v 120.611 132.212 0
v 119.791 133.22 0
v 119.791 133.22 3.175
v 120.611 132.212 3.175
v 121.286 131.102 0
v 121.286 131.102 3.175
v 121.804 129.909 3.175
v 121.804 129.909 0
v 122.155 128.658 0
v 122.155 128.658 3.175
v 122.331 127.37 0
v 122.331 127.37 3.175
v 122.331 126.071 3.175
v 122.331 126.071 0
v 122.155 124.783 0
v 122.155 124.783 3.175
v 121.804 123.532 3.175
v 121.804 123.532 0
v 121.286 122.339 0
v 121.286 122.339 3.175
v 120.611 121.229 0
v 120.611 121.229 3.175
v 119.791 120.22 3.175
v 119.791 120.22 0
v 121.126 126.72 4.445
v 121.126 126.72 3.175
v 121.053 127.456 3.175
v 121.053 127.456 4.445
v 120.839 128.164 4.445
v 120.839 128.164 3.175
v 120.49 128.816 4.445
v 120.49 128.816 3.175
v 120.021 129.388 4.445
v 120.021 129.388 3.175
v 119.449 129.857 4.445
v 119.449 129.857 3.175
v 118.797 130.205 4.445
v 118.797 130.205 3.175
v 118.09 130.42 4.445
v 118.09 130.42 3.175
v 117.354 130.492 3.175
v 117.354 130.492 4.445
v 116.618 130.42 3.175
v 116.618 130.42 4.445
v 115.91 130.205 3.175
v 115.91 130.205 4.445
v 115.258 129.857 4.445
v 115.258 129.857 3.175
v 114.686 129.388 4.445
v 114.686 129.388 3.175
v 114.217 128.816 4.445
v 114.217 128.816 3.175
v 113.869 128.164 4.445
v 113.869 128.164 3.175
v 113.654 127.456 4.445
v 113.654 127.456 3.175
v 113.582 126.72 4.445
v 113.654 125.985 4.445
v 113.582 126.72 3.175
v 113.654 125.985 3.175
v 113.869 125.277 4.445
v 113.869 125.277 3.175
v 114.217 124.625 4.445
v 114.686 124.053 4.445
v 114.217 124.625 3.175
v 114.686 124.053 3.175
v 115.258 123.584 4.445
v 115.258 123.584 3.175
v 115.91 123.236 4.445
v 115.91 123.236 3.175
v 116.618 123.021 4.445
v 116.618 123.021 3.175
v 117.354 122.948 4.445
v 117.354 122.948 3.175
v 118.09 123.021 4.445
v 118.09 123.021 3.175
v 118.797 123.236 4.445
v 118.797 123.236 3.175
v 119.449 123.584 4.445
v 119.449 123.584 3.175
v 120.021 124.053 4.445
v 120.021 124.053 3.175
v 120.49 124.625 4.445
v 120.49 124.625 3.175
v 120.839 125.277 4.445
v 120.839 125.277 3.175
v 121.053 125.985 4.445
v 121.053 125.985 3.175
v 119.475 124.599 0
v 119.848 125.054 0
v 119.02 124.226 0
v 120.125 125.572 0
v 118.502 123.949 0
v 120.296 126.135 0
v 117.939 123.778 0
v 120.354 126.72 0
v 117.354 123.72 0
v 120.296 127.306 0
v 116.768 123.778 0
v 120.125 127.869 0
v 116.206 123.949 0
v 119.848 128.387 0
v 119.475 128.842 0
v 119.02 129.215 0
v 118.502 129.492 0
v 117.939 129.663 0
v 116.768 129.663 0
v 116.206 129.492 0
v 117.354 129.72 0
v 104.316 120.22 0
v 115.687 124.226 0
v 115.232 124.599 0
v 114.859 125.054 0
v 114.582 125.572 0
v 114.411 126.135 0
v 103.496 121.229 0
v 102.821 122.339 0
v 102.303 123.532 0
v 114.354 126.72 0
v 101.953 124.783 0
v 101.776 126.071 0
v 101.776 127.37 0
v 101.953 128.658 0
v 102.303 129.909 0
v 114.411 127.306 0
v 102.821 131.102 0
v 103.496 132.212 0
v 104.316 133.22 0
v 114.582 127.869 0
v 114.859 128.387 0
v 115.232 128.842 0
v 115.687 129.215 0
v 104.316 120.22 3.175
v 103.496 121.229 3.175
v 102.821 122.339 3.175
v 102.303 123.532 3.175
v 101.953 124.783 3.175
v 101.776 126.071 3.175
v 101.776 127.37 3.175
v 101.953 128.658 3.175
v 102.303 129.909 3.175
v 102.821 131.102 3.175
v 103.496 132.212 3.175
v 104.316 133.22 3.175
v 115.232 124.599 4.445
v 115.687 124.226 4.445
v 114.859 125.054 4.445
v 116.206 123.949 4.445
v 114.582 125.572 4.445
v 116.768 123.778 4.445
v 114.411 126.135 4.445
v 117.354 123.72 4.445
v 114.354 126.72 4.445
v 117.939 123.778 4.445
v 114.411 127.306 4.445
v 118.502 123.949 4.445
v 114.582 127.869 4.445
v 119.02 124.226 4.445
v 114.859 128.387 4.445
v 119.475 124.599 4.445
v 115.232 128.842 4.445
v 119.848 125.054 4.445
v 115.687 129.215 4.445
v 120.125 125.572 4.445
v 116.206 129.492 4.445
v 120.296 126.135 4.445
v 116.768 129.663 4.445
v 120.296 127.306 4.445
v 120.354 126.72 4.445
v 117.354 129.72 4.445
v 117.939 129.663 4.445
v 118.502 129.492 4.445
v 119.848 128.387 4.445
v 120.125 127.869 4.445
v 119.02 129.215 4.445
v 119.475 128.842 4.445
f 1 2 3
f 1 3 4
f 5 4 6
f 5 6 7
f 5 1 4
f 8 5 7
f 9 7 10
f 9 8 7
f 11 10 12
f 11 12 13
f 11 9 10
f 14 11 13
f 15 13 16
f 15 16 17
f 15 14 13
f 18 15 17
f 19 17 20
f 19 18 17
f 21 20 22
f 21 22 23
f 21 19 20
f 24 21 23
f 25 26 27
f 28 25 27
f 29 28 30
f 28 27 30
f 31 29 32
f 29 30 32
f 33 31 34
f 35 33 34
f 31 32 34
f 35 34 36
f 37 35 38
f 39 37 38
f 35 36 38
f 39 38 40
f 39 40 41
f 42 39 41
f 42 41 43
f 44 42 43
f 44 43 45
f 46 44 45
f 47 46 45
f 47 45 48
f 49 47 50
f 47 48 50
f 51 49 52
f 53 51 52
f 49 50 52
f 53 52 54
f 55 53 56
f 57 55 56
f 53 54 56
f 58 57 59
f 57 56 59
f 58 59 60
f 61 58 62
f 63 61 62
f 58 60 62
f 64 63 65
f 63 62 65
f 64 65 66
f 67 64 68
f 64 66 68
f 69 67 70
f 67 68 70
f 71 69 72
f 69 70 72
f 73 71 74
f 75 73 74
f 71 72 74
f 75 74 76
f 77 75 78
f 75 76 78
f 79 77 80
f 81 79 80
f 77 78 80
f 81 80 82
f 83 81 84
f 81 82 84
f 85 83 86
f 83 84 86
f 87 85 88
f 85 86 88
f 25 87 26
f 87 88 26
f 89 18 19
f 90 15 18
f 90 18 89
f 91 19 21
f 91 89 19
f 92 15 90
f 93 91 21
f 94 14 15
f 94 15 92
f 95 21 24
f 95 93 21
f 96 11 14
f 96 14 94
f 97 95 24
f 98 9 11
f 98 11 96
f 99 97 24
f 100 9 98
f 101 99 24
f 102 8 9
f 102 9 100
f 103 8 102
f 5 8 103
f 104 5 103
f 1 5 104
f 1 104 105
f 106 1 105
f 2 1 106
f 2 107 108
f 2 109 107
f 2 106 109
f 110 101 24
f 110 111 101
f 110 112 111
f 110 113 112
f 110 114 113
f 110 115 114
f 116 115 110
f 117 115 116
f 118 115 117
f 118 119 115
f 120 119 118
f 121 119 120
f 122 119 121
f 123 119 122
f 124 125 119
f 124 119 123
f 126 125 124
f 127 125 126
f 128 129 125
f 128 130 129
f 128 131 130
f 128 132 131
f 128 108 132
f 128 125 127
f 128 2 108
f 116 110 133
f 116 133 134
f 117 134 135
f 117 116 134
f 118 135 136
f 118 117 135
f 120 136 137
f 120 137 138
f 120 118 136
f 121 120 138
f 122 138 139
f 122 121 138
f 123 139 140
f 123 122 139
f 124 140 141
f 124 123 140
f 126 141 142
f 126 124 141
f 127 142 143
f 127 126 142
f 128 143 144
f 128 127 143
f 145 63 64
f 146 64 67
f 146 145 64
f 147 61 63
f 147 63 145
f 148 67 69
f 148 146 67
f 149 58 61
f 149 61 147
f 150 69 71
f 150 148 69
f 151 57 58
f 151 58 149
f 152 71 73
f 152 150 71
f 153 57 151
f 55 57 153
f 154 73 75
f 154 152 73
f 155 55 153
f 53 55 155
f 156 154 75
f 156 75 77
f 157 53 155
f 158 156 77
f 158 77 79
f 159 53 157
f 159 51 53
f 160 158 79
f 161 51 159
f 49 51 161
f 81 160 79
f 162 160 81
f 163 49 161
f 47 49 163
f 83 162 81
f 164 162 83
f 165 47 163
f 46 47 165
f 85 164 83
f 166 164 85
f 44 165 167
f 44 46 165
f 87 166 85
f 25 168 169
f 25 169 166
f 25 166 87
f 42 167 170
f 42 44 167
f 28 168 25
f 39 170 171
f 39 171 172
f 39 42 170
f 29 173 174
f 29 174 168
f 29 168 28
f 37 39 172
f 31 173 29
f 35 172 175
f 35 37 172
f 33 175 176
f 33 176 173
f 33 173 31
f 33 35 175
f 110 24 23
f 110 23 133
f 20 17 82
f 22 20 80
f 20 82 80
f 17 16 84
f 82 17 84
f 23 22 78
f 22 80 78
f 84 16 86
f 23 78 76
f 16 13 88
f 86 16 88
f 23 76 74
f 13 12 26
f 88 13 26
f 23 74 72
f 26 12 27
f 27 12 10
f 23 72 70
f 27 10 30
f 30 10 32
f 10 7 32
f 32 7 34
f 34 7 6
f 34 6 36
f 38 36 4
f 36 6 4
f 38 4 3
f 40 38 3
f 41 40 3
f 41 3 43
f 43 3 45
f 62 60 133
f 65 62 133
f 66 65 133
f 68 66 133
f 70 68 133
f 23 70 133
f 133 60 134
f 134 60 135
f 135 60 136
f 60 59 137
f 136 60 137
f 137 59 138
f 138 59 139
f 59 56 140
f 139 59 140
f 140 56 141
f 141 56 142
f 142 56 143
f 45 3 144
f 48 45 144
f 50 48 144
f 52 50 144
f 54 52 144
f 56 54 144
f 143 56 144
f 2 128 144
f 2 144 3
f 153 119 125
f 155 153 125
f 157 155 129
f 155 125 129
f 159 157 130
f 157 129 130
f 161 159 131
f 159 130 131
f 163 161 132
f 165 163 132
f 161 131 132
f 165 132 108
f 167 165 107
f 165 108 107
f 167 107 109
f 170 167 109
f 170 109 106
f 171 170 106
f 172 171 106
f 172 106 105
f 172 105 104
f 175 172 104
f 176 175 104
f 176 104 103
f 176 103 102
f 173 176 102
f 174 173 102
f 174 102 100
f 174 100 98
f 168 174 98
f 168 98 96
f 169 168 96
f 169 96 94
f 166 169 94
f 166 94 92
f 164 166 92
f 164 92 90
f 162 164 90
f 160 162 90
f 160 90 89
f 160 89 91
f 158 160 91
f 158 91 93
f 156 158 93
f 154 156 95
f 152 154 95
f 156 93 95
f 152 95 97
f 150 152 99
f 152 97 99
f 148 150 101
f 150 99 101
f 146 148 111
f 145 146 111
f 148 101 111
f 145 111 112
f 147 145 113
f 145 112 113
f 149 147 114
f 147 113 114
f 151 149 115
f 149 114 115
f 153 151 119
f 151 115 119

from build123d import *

# Parameters (mm, degrees)
EXTRUDE1_DEPTH     = 3.175
SKETCH4_R          = 3.772
EXTRUDE3_DEPTH     = 1.27
SKETCH6_R          = 3
CUT_EXTRUDE1_DEPTH = 181.936091825


with BuildPart() as part:
    # Sketch1 → Extrude1 (new body)
    with BuildSketch(Plane.XY):
        with BuildLine():
            Line((104.316218765, 133.220465896), (119.791106556, 133.220465896))
            ThreePointArc((119.791106556, 133.220465896), (122.35366266, 126.720465896), (119.791106556, 120.220465896))
            Line((119.791106556, 120.220465896), (104.316218765, 120.220465896))
            ThreePointArc((104.316218765, 120.220465896), (101.75366266, 126.720465896), (104.316218765, 133.220465896))
        make_face()
    extrude(amount=EXTRUDE1_DEPTH)

    # Sketch4 → Extrude3 (add)
    with BuildSketch(Plane.XY.offset(3.175)):
        with Locations((117.35366266, 126.720465896)):
            Circle(SKETCH4_R)
    extrude(amount=EXTRUDE3_DEPTH)

    # Sketch6 → Cut-Extrude1 (cut, through all)
    with BuildSketch(Plane(origin=(0, 0, 0), x_dir=(-1, 0, 0), z_dir=(0, 0, -1))):
        with Locations((-117.35366266, 126.720465896)):
            Circle(SKETCH6_R)
    extrude(amount=-CUT_EXTRUDE1_DEPTH, mode=Mode.SUBTRACT)


solid = part.part
